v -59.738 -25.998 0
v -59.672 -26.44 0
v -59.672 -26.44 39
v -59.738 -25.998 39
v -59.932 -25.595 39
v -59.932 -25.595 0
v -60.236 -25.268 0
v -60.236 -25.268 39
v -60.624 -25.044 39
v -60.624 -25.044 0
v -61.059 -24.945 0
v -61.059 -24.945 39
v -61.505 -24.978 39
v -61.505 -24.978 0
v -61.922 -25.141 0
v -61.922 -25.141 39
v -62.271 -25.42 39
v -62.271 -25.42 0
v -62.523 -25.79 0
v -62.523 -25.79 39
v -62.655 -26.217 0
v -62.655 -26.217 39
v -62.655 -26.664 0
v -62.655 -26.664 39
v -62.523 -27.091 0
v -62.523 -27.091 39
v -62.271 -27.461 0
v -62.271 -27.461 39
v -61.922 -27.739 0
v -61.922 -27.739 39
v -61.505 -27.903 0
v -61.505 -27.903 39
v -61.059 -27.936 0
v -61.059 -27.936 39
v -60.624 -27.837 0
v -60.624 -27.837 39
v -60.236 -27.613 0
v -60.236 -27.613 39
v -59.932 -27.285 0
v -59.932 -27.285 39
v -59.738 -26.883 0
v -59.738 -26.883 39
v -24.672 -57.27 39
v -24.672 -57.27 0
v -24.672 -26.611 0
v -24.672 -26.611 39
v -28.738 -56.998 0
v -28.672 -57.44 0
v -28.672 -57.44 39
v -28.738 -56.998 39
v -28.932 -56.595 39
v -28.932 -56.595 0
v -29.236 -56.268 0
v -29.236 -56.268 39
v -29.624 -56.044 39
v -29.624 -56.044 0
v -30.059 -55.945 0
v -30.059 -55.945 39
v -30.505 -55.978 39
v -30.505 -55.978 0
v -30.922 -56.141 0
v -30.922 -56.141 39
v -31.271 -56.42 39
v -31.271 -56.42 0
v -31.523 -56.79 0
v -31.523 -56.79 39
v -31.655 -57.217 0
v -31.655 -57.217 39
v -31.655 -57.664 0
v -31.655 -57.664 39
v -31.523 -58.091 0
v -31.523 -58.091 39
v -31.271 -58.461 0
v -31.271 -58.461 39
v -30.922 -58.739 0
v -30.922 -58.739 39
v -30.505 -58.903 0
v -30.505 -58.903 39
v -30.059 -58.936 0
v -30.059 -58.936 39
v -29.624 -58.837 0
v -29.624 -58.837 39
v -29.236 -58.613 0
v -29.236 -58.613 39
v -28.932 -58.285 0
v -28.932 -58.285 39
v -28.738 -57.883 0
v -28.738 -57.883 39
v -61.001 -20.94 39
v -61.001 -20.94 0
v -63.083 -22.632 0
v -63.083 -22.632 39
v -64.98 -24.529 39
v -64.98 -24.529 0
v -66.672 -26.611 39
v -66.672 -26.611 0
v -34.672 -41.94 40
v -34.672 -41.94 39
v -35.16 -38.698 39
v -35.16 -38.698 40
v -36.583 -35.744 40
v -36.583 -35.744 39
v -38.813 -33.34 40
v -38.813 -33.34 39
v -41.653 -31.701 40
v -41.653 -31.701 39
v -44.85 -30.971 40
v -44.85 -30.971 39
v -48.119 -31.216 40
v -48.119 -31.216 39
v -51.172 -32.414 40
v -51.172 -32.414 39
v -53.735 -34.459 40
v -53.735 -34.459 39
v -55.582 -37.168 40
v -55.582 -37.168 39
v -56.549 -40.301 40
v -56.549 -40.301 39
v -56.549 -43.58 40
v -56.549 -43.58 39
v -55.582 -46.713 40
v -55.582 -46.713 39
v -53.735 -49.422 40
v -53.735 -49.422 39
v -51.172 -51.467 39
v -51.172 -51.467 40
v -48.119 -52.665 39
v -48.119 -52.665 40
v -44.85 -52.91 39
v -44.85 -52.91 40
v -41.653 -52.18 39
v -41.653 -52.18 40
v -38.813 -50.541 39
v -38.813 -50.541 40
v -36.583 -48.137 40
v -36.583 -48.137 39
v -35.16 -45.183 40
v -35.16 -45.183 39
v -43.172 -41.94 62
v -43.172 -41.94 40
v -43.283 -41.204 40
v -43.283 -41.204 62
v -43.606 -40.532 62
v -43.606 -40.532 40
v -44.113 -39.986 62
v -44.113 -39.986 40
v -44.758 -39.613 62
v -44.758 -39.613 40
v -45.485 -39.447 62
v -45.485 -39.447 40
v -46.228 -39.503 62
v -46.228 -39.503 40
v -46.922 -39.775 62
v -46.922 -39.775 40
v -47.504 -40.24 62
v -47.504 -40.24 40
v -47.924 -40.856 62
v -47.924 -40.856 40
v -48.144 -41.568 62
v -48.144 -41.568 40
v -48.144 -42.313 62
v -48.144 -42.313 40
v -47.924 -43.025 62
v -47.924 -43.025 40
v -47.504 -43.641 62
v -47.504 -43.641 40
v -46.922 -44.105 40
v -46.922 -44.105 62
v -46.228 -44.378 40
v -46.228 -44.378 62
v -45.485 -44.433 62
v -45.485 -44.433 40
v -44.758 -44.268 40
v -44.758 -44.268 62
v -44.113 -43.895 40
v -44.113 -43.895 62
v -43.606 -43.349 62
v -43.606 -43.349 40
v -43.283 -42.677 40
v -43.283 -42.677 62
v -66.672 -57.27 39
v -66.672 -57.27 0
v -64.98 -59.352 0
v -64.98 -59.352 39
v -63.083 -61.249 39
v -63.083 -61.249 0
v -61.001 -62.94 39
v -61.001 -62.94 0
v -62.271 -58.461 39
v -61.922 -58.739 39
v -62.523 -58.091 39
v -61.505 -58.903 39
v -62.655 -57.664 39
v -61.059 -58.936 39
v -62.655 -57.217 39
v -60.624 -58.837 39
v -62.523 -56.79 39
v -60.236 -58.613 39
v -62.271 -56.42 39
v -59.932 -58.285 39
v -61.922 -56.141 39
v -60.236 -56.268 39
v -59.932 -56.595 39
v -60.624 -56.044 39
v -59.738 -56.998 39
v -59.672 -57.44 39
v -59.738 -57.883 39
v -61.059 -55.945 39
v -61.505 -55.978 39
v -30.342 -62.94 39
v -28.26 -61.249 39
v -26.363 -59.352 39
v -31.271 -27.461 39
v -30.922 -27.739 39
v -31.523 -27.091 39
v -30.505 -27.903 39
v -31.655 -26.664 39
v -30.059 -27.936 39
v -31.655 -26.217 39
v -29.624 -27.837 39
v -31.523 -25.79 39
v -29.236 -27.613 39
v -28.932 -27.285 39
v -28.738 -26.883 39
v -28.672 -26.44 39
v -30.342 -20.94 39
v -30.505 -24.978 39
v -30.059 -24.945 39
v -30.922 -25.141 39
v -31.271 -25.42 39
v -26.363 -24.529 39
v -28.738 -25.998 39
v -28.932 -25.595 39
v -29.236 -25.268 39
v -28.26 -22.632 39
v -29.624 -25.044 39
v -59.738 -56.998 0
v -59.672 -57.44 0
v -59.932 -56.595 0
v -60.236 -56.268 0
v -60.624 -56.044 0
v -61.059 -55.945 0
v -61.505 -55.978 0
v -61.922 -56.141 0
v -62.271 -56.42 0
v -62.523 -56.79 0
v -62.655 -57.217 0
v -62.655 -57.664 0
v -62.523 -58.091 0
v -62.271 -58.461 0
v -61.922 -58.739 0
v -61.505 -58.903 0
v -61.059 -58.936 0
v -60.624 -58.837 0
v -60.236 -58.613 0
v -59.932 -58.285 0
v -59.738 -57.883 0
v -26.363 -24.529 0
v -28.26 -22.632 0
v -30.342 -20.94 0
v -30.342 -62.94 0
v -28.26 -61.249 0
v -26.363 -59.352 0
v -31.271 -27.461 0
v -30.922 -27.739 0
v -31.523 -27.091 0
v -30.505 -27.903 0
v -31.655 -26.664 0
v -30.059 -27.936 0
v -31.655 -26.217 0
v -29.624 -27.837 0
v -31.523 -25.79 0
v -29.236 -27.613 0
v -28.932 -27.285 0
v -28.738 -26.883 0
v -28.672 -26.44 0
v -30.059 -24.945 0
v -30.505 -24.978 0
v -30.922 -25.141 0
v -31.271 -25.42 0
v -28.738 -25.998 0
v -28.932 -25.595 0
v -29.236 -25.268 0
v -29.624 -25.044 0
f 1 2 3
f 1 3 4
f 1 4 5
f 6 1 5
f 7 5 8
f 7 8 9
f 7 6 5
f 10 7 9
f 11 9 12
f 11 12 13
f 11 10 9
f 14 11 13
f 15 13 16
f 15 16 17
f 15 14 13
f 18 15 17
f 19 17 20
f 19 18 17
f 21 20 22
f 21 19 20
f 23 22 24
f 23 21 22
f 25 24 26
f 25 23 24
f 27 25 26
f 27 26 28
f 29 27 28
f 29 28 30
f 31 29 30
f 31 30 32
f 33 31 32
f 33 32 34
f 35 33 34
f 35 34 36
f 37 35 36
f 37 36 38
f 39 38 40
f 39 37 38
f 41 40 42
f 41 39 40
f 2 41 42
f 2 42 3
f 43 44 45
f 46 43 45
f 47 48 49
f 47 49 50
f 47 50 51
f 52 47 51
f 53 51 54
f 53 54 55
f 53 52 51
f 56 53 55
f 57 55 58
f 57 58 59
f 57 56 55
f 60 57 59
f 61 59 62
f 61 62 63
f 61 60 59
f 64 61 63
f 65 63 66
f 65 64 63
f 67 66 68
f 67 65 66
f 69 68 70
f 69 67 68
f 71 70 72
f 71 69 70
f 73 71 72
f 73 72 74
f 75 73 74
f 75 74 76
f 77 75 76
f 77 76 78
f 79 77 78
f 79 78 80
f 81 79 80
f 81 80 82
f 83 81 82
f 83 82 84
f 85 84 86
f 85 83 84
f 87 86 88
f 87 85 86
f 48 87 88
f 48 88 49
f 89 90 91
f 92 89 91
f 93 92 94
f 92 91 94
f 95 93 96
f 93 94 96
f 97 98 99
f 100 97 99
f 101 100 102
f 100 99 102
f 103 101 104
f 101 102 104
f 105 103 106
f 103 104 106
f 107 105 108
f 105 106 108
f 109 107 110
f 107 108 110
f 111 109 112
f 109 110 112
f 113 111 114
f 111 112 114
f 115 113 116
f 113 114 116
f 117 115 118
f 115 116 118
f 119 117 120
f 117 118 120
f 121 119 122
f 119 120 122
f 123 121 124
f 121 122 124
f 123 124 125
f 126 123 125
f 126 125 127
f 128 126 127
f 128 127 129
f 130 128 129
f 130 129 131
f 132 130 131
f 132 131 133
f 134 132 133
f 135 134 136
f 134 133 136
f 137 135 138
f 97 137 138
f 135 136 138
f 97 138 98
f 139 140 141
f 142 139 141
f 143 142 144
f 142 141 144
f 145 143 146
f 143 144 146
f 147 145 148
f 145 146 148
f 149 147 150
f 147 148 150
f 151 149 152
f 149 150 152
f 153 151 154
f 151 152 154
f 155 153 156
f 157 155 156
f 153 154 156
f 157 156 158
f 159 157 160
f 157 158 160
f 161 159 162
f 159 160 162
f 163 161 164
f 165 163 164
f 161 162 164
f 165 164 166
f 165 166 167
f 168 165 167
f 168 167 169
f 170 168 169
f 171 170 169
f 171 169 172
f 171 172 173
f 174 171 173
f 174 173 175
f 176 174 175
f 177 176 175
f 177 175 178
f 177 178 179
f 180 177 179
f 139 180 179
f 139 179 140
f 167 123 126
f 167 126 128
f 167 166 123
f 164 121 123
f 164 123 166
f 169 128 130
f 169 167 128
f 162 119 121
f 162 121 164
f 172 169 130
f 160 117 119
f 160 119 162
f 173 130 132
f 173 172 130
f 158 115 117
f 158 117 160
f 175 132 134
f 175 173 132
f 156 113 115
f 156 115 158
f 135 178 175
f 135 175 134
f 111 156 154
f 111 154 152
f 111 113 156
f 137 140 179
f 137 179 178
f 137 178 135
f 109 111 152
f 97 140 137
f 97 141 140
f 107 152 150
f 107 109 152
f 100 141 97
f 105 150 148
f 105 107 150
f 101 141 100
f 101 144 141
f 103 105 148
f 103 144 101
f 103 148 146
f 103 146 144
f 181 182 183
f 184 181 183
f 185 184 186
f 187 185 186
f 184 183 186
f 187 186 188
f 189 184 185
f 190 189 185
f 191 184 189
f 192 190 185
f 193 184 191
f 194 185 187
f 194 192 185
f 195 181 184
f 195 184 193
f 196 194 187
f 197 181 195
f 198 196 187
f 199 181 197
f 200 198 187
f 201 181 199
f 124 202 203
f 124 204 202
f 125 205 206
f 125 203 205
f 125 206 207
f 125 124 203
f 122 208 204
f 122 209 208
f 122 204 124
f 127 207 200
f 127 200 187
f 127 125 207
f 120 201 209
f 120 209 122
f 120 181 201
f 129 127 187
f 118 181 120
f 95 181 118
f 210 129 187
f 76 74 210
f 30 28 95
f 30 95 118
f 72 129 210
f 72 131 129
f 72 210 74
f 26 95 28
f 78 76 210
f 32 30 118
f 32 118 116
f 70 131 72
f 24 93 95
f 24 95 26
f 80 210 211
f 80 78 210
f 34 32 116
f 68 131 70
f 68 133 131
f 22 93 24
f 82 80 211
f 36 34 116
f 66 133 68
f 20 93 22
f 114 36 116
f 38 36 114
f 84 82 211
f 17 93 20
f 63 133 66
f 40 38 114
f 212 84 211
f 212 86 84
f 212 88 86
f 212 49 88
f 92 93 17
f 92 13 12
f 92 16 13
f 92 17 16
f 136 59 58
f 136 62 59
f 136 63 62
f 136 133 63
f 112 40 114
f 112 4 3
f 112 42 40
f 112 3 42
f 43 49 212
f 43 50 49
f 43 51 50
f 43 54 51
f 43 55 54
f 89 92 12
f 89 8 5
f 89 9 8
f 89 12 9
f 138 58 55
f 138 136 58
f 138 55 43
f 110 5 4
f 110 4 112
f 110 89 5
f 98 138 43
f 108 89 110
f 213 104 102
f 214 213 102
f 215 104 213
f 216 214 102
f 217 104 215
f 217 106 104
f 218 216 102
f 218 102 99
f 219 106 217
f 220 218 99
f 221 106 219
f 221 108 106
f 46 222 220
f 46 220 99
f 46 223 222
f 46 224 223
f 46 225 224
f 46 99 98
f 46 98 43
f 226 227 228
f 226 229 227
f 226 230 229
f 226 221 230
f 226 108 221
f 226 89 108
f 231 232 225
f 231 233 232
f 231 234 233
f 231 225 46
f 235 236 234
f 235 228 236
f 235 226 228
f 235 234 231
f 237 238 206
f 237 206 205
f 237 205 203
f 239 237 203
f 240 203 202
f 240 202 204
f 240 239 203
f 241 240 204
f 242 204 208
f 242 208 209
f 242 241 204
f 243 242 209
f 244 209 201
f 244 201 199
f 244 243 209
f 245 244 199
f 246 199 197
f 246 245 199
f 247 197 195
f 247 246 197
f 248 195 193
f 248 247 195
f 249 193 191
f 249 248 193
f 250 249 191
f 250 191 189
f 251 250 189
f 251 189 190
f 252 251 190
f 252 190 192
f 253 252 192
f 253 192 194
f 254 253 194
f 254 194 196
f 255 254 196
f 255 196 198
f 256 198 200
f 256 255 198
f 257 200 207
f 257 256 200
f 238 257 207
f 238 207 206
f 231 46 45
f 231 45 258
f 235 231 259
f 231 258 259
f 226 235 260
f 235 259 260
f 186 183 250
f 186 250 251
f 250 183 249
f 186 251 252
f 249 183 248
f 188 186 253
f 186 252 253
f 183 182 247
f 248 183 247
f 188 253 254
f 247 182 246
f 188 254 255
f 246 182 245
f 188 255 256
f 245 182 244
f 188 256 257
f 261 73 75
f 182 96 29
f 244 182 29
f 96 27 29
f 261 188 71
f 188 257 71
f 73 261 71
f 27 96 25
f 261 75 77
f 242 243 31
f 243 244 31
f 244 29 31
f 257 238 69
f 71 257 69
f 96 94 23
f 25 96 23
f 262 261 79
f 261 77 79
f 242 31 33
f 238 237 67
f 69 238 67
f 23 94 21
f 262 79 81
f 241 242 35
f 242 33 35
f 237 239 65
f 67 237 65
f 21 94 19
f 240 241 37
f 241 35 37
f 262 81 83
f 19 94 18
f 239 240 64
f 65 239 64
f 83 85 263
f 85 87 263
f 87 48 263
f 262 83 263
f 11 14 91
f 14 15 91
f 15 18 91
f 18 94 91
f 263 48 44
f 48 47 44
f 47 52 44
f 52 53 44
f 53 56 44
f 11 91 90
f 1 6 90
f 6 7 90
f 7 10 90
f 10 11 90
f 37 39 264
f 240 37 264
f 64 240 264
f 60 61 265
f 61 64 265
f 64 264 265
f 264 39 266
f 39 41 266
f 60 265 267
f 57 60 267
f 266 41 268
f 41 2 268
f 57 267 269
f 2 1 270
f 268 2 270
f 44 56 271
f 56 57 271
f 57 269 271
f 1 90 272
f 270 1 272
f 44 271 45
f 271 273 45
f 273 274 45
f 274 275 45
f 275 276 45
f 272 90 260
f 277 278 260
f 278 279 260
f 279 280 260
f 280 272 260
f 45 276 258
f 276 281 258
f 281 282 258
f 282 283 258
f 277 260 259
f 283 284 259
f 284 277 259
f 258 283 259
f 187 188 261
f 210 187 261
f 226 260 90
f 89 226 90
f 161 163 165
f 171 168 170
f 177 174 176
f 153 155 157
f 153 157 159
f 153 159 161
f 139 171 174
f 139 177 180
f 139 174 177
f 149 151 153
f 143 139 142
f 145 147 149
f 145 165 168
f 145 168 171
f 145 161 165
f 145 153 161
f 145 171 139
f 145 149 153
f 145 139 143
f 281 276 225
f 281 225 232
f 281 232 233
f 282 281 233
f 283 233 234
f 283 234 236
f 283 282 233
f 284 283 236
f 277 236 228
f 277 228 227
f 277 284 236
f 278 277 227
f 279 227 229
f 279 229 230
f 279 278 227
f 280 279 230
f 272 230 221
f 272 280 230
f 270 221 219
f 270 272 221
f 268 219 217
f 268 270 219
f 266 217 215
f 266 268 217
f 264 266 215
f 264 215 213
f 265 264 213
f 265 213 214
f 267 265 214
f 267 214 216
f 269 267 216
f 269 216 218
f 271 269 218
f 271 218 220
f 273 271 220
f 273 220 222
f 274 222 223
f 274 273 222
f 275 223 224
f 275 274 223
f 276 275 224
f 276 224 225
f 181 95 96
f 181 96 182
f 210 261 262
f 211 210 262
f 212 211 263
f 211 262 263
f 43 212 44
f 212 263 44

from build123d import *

# Parameters (mm, degrees)
F0_R     = 1.5
F1_DEPTH = 39
F2_R     = 2.5
F3_DEPTH = 23
F4_R     = 11
F5_DEPTH = 1


with BuildPart() as f1:
    # F0 (on Top) → F1 (new body)
    with BuildSketch(Plane.XY):
        with BuildLine():
            ThreePointArc((-66.671558, -57.270136), (-64.056334, -60.325202), (-61.001267, -62.940426))
            Line((-61.001267, -62.940426), (-30.341848, -62.940426))
            ThreePointArc((-30.341848, -62.940426), (-27.286781, -60.325202), (-24.671558, -57.270136))
            Line((-24.671558, -57.270136), (-24.671558, -26.610716))
            ThreePointArc((-24.671558, -26.610716), (-27.286781, -23.55565), (-30.341848, -20.940426))
            Line((-30.341848, -20.940426), (-61.001267, -20.940426))
            ThreePointArc((-61.001267, -20.940426), (-64.056334, -23.55565), (-66.671558, -26.610716))
            Line((-66.671558, -26.610716), (-66.671558, -57.270136))
        make_face()
        with Locations((-61.171558, -57.440426)):
            Circle(F0_R, mode=Mode.SUBTRACT)
        with Locations((-30.171558, -57.440426)):
            Circle(F0_R, mode=Mode.SUBTRACT)
        with Locations((-61.171558, -26.440426)):
            Circle(F0_R, mode=Mode.SUBTRACT)
        with Locations((-30.171558, -26.440426)):
            Circle(F0_R, mode=Mode.SUBTRACT)
    extrude(amount=F1_DEPTH)

    # F2 (on face) → F3 (join)
    with BuildSketch(Plane.XY.offset(39)):
        with Locations((-45.671558, -41.940426)):
            Circle(F2_R)
    extrude(amount=F3_DEPTH)

    # F4 (on face) → F5 (join)
    with BuildSketch(Plane.XY.offset(39)):
        with Locations((-45.671558, -41.940426)):
            Circle(F4_R)
    extrude(amount=F5_DEPTH)


solid = f1.part
